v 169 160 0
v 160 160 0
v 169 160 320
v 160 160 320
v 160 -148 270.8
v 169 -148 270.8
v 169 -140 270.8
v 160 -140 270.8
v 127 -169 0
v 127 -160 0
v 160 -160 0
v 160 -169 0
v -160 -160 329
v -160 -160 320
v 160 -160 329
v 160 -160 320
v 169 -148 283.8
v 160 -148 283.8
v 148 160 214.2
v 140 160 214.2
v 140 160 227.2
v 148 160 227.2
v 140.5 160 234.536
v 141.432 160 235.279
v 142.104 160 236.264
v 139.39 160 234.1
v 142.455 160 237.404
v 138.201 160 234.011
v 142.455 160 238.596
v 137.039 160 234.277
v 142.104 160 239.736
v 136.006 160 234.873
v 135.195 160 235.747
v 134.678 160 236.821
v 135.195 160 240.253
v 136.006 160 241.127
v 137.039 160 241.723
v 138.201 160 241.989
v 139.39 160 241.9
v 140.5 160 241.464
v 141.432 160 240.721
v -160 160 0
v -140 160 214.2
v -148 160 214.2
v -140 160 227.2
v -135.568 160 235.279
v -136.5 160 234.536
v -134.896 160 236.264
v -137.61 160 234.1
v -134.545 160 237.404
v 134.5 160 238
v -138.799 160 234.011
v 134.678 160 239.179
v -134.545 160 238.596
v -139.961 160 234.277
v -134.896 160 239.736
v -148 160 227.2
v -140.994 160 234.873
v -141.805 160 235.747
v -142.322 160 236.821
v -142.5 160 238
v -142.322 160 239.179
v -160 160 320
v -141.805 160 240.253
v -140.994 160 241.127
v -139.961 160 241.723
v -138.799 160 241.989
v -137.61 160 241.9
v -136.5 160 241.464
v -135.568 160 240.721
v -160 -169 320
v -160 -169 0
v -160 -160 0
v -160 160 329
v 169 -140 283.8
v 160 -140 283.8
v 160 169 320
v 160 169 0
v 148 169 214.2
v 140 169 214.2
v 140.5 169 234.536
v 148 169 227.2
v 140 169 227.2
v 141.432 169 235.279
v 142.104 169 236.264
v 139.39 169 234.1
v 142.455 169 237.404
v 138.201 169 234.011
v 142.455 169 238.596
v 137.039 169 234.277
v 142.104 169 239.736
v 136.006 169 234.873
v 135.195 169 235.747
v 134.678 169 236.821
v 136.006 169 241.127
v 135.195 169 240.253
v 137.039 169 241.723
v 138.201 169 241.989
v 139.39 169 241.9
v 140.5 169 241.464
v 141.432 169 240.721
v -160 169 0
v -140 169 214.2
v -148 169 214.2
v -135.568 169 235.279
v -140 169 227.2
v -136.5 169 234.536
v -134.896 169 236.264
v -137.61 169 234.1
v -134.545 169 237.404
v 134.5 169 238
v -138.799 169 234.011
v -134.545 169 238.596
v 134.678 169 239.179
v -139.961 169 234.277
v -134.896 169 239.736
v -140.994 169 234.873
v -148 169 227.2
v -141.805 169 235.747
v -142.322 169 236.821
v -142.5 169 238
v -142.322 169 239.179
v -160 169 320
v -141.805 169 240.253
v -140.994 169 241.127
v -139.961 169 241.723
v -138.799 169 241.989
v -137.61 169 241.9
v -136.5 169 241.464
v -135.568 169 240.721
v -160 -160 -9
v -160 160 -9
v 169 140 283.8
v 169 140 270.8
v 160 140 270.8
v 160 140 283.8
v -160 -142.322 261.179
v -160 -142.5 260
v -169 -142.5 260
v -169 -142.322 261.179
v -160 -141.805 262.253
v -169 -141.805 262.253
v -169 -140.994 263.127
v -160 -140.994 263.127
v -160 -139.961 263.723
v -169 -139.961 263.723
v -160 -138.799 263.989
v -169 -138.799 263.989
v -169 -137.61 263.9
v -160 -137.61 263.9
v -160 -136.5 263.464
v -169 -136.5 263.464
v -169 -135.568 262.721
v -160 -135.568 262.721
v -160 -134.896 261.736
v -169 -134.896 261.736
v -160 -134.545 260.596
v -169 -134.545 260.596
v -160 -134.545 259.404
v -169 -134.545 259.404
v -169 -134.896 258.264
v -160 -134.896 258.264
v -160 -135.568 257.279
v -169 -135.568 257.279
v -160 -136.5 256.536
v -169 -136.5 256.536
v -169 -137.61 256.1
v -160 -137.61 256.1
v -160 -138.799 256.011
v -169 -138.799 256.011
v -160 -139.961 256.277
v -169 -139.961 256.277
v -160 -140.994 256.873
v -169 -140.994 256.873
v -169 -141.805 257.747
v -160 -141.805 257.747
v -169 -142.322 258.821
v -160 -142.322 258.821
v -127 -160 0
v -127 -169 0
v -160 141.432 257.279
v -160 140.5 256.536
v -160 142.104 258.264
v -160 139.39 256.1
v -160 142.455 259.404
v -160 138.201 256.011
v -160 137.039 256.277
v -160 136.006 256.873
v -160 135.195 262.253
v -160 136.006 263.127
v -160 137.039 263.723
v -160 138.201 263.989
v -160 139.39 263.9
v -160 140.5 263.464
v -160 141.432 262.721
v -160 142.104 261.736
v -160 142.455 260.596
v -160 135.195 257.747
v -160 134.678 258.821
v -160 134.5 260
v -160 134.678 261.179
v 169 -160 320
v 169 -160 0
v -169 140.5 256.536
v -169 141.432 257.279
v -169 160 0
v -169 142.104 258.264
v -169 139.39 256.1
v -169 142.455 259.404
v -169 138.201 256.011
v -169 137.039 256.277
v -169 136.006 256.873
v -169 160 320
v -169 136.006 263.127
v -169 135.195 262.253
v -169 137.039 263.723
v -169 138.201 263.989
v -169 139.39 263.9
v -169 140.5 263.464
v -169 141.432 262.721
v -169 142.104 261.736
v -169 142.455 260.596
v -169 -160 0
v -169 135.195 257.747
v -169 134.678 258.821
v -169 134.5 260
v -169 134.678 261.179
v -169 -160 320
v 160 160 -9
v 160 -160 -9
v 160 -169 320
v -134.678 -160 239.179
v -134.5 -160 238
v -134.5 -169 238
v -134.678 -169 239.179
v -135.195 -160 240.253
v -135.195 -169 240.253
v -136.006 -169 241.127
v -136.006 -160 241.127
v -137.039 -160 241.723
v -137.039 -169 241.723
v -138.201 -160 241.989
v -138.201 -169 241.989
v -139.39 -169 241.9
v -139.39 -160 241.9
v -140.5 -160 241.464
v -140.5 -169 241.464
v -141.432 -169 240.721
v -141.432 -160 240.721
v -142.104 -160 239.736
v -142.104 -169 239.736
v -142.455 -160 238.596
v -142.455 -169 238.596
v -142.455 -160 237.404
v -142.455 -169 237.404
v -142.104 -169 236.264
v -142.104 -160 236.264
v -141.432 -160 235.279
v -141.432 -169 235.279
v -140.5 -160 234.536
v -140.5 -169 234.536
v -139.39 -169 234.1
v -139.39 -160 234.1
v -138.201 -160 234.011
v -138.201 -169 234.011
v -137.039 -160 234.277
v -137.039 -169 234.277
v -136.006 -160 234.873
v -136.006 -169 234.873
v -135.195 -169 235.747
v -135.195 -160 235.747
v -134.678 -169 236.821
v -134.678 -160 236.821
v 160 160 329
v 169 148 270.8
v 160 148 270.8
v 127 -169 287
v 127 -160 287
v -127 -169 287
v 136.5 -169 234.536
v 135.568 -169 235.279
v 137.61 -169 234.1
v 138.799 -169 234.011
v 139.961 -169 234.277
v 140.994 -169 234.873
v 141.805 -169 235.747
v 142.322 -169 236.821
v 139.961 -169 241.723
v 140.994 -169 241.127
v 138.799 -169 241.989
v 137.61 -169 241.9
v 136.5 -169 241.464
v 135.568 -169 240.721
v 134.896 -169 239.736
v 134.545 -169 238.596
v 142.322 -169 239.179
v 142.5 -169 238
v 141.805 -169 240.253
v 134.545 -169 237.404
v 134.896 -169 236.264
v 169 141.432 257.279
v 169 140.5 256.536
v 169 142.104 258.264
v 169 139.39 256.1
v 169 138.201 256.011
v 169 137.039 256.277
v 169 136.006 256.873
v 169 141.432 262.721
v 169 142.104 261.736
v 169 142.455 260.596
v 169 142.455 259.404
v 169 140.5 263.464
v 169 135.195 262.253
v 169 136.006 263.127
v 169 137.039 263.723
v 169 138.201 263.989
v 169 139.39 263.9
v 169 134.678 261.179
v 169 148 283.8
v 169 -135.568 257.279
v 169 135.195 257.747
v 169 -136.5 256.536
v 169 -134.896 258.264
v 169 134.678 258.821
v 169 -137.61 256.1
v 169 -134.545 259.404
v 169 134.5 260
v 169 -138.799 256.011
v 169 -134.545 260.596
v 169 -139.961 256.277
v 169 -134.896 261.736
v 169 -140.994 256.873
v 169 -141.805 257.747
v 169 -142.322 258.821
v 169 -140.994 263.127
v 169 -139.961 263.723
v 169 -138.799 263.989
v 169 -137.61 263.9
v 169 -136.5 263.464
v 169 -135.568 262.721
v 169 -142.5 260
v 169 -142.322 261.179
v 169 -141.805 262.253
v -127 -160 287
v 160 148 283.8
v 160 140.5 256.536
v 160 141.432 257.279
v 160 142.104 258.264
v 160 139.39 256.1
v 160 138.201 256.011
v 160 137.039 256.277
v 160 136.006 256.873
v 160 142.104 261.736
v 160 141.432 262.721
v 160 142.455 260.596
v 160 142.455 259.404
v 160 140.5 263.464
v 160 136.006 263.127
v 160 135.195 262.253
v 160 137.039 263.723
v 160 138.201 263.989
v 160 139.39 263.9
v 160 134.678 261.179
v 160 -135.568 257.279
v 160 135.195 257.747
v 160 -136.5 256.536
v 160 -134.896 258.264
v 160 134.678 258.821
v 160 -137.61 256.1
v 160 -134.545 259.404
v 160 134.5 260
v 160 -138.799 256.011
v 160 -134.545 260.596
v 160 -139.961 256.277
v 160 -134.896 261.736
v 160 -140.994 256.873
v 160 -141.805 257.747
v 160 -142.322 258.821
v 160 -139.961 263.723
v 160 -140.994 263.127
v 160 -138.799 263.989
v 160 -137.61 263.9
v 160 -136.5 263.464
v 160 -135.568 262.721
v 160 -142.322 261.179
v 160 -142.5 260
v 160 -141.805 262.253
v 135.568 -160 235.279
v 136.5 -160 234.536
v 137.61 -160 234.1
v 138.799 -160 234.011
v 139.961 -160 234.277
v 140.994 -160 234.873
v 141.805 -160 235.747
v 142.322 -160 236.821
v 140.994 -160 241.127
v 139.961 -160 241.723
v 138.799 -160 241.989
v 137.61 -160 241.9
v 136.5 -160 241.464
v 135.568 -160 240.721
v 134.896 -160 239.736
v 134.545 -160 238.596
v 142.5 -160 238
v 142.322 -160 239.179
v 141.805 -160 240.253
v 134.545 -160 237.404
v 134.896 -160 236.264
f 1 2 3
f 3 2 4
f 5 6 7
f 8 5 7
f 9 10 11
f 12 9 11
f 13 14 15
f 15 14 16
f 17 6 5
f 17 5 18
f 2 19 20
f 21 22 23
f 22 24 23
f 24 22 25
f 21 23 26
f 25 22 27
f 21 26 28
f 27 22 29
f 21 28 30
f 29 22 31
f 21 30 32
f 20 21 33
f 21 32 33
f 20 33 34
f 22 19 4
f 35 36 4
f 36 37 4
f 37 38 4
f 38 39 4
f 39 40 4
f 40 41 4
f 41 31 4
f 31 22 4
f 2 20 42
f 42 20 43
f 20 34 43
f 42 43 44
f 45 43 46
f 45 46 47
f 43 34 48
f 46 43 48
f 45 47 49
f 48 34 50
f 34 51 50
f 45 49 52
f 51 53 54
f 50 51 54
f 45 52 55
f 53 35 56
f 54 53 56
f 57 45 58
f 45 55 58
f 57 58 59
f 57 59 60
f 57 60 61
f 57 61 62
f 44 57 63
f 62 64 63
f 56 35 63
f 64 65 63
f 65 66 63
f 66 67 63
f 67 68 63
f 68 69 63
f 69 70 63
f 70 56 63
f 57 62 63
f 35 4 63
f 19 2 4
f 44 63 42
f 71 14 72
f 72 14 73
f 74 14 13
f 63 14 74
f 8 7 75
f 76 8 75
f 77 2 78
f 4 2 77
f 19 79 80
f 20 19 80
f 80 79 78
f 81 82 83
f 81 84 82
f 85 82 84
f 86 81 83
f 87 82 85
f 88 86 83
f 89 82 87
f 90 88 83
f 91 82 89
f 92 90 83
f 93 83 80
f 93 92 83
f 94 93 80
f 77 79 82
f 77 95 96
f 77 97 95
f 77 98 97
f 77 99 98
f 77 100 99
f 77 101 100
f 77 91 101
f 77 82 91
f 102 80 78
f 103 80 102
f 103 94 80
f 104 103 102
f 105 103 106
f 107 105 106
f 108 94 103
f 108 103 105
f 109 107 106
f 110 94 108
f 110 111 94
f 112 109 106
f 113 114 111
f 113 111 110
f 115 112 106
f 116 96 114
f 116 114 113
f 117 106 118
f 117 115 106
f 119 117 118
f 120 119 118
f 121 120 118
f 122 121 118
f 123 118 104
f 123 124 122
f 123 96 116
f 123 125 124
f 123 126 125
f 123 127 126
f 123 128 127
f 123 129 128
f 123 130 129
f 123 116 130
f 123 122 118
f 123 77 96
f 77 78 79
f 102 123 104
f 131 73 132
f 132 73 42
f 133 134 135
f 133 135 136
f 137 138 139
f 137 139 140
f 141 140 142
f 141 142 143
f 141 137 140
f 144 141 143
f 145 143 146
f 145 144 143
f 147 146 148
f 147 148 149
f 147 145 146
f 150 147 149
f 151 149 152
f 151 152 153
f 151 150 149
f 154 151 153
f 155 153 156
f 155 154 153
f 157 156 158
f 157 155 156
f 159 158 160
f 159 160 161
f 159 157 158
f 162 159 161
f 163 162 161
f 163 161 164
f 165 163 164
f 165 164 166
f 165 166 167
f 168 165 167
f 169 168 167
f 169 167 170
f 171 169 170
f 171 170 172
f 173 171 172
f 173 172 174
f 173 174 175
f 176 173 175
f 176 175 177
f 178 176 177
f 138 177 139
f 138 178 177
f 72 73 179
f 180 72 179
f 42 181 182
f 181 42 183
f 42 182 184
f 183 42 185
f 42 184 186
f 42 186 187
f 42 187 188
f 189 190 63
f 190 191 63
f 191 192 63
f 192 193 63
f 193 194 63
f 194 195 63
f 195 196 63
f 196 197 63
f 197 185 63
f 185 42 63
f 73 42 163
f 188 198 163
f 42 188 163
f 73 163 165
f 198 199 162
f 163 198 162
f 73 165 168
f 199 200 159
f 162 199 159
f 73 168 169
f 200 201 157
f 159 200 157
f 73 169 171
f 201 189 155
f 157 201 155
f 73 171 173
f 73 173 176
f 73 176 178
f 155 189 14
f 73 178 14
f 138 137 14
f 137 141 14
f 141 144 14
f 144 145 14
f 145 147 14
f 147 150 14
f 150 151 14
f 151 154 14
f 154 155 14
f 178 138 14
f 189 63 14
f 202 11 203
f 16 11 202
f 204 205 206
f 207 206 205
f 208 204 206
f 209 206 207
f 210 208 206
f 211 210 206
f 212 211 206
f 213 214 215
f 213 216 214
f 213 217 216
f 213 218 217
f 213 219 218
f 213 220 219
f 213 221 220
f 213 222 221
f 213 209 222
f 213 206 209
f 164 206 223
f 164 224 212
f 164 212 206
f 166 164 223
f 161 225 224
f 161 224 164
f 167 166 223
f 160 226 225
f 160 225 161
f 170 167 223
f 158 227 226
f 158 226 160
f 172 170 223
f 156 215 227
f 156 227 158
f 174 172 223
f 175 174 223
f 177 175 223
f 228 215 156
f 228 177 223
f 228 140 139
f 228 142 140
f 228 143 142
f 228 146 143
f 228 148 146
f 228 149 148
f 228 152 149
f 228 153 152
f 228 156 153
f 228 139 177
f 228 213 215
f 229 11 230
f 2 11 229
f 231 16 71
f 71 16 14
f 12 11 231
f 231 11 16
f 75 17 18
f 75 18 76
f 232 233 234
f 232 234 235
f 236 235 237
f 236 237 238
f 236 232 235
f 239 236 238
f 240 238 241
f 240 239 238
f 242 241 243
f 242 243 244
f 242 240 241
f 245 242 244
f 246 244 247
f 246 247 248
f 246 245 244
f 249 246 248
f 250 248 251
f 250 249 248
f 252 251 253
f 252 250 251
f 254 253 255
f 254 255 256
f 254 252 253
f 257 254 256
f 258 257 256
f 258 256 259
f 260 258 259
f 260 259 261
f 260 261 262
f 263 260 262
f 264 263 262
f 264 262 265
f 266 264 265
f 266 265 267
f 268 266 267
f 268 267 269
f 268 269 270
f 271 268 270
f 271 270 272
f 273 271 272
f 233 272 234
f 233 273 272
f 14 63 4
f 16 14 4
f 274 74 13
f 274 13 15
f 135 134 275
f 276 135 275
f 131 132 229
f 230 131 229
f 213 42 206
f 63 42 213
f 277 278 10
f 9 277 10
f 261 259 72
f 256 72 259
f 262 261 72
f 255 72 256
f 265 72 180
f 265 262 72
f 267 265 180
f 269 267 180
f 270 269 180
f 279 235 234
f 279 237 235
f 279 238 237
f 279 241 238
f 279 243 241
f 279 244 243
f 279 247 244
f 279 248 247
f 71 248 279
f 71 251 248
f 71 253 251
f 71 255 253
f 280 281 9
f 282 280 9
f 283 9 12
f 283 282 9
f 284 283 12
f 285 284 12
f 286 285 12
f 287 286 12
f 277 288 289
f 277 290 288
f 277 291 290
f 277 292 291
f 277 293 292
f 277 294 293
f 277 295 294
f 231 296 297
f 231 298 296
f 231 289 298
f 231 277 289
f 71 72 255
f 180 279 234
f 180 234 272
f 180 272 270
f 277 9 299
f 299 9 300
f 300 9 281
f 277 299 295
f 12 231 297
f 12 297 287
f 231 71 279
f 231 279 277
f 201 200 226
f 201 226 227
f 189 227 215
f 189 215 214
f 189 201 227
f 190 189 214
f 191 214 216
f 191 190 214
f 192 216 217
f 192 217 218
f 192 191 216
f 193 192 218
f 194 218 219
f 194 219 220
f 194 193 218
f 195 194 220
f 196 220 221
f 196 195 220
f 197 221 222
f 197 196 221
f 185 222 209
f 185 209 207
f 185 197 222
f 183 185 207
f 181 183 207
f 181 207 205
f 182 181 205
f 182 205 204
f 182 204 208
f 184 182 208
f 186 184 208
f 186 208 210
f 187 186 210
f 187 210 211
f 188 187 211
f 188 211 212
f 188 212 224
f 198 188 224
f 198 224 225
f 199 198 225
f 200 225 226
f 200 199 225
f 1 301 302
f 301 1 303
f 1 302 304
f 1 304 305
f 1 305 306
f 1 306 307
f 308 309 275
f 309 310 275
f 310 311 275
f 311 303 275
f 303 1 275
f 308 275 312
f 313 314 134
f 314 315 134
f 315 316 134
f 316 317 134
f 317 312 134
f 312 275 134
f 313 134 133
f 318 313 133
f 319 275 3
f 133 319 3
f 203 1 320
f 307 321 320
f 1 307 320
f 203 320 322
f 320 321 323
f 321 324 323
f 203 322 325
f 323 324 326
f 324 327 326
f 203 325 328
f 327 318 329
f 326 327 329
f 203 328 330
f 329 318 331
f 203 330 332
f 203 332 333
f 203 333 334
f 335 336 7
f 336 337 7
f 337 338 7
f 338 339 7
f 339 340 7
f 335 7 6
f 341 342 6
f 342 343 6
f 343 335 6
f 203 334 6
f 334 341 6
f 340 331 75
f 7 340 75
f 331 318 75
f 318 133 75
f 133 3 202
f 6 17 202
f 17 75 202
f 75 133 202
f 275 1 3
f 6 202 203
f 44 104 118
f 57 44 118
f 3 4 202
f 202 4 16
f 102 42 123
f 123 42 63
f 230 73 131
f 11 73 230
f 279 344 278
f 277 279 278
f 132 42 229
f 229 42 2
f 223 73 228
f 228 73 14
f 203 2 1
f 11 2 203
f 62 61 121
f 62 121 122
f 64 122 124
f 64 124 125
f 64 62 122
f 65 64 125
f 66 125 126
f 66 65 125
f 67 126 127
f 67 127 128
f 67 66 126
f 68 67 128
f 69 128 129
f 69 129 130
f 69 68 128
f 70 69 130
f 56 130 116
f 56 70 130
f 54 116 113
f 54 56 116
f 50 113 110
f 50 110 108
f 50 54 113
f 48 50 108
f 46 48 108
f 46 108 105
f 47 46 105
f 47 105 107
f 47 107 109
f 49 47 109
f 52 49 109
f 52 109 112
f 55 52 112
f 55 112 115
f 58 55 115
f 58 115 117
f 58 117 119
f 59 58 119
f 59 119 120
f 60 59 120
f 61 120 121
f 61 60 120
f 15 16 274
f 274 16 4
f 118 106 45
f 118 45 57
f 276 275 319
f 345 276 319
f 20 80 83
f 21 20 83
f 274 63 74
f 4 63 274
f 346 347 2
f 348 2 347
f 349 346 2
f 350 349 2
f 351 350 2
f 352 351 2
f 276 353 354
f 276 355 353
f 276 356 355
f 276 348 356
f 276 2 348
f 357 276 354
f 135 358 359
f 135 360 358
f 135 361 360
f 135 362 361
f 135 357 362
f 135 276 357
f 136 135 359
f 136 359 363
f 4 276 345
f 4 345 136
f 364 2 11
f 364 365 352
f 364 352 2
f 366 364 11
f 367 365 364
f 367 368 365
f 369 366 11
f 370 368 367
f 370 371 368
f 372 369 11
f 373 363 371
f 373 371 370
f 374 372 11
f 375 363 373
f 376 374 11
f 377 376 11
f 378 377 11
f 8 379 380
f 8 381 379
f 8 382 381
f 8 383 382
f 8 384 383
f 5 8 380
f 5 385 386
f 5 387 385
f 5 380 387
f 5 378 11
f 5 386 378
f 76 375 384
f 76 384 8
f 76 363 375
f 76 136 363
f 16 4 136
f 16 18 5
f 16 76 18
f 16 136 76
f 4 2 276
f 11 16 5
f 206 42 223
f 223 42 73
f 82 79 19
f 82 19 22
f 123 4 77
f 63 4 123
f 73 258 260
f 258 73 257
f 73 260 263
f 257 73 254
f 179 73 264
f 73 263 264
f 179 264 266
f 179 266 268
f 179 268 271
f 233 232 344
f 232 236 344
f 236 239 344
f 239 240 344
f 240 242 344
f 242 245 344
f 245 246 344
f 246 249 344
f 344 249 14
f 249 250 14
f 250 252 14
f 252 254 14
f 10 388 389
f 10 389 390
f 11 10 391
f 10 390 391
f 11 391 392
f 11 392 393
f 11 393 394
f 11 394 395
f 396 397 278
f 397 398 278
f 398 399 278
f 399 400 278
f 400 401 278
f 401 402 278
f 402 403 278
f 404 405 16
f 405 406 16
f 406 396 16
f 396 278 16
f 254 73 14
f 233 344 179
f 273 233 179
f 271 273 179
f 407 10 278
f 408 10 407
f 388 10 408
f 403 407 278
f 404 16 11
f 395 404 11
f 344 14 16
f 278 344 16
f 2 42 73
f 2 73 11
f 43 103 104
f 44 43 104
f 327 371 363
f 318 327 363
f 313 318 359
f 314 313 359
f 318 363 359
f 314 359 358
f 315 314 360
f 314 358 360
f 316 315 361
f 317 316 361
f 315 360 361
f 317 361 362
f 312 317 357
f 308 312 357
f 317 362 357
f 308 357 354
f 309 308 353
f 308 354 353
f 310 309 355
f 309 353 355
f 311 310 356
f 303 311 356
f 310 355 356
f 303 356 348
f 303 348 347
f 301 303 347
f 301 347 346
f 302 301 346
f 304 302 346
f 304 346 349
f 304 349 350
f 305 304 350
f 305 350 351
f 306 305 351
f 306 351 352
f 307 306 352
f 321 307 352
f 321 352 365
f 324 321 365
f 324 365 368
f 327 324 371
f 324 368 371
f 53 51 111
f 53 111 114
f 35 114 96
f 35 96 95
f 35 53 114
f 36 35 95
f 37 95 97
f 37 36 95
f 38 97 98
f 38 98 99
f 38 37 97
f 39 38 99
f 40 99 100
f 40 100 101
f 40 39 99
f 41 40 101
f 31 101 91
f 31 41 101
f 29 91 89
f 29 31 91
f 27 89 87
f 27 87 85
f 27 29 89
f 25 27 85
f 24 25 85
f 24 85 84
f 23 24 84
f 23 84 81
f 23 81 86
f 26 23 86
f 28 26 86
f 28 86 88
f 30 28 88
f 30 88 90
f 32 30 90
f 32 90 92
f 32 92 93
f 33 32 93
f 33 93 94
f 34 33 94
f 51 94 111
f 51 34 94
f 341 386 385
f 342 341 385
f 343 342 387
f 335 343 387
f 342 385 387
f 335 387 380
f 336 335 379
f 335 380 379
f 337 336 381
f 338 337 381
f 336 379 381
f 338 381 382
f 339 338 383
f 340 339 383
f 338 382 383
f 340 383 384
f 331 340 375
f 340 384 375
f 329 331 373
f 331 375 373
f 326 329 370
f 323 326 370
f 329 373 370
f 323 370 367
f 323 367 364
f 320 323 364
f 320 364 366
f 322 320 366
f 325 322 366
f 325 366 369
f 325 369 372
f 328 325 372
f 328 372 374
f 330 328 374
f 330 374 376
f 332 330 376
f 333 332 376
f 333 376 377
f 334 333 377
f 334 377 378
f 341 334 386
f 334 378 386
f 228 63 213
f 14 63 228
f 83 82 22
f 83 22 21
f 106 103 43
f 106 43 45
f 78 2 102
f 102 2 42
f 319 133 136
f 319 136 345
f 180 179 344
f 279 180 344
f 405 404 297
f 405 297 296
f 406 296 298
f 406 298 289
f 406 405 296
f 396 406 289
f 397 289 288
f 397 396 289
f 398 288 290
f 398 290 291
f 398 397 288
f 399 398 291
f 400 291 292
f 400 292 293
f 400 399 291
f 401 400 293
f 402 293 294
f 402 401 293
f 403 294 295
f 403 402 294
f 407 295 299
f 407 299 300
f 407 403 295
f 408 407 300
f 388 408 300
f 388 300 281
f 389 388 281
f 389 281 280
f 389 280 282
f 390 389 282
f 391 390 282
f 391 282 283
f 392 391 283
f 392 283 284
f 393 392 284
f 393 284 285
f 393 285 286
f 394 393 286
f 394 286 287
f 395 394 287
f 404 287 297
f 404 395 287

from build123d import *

# Parameters (mm, degrees)
F1_W      = 320
F1_H      = 320
F2_DEPTH  = 9
F3_W      = 320
F3_H      = 320
F3_R      = 4
F4_DEPTH  = 9
F7_W      = 320
F7_H      = 320
F7_R      = 4
F8_DEPTH  = 9
F6_R      = 4
F9_DEPTH  = 9
F10_W     = 320
F10_H     = 320
F11_DEPTH = 9
F12_W     = 8
F12_H     = 13
F13_DEPTH = 9
F14_W     = 8
F14_H     = 13
F15_DEPTH = 9


with BuildPart() as f2:
    # F1 (on Top) → F2 (new body)
    with BuildSketch(Plane.XY):
        Rectangle(F1_W, F1_H)
    extrude(amount=-F2_DEPTH)


with BuildPart() as f4:
    # F3 (on face) → F4 (new body)
    with BuildSketch(Plane(origin=(-160, 0, 0), x_dir=(0, -1, 0), z_dir=(-1, 0, 0))):
        with Locations((0, 160)):
            Rectangle(F3_W, F3_H)
        with Locations((-138.5, 260)):
            Circle(F3_R, mode=Mode.SUBTRACT)
        with Locations((138.5, 260)):
            Circle(F3_R, mode=Mode.SUBTRACT)
    extrude(amount=F4_DEPTH)


with BuildPart() as f5_1:
    # F5: instance of F4
    add(f4.part.mirror(Plane.YZ))

    # F12 (on face) → F13 (cut, through all)
    with BuildSketch(Plane.YZ.offset(169)):
        with Locations((-144, 277.3)):
            Rectangle(F12_W, F12_H)
        with Locations((144, 277.3)):
            Rectangle(F12_W, F12_H)
    extrude(amount=-F13_DEPTH, mode=Mode.SUBTRACT)


with BuildPart() as f8:
    # F7 (on face) → F8 (new body)
    with BuildSketch(Plane(origin=(0, 160, 0), x_dir=(-1, 0, 0), z_dir=(0, 1, 0))):
        with Locations((0, 160)):
            Rectangle(F7_W, F7_H)
        with Locations((-138.5, 238)):
            Circle(F7_R, mode=Mode.SUBTRACT)
        with Locations((138.5, 238)):
            Circle(F7_R, mode=Mode.SUBTRACT)
    extrude(amount=F8_DEPTH)

    # F14 (on face) → F15 (cut, through all)
    with BuildSketch(Plane(origin=(0, 169, 0), x_dir=(-1, 0, 0), z_dir=(0, 1, 0))):
        with Locations((-144, 220.7)):
            Rectangle(F14_W, F14_H)
        with Locations((144, 220.7)):
            Rectangle(F14_W, F14_H)
    extrude(amount=-F15_DEPTH, mode=Mode.SUBTRACT)


with BuildPart() as f9:
    # F6 (on face) → F9 (new body)
    with BuildSketch(Plane.XZ.offset(160)):
        Polygon((-160, 320), (-160, 0), (-127, 0), (-127, 287), (127, 287), (127, 0), (160, 0), (160, 320), align=None)
        with Locations((-138.5, 238)):
            Circle(F6_R, mode=Mode.SUBTRACT)
        with Locations((138.5, 238)):
            Circle(F6_R, mode=Mode.SUBTRACT)
    extrude(amount=F9_DEPTH)


with BuildPart() as f11:
    # F10 (on face) → F11 (new body)
    with BuildSketch(Plane.XY.offset(320)):
        Rectangle(F10_W, F10_H)
    extrude(amount=F11_DEPTH)


solid = Compound([f2.part, f4.part, f5_1.part, f8.part, f9.part, f11.part])
